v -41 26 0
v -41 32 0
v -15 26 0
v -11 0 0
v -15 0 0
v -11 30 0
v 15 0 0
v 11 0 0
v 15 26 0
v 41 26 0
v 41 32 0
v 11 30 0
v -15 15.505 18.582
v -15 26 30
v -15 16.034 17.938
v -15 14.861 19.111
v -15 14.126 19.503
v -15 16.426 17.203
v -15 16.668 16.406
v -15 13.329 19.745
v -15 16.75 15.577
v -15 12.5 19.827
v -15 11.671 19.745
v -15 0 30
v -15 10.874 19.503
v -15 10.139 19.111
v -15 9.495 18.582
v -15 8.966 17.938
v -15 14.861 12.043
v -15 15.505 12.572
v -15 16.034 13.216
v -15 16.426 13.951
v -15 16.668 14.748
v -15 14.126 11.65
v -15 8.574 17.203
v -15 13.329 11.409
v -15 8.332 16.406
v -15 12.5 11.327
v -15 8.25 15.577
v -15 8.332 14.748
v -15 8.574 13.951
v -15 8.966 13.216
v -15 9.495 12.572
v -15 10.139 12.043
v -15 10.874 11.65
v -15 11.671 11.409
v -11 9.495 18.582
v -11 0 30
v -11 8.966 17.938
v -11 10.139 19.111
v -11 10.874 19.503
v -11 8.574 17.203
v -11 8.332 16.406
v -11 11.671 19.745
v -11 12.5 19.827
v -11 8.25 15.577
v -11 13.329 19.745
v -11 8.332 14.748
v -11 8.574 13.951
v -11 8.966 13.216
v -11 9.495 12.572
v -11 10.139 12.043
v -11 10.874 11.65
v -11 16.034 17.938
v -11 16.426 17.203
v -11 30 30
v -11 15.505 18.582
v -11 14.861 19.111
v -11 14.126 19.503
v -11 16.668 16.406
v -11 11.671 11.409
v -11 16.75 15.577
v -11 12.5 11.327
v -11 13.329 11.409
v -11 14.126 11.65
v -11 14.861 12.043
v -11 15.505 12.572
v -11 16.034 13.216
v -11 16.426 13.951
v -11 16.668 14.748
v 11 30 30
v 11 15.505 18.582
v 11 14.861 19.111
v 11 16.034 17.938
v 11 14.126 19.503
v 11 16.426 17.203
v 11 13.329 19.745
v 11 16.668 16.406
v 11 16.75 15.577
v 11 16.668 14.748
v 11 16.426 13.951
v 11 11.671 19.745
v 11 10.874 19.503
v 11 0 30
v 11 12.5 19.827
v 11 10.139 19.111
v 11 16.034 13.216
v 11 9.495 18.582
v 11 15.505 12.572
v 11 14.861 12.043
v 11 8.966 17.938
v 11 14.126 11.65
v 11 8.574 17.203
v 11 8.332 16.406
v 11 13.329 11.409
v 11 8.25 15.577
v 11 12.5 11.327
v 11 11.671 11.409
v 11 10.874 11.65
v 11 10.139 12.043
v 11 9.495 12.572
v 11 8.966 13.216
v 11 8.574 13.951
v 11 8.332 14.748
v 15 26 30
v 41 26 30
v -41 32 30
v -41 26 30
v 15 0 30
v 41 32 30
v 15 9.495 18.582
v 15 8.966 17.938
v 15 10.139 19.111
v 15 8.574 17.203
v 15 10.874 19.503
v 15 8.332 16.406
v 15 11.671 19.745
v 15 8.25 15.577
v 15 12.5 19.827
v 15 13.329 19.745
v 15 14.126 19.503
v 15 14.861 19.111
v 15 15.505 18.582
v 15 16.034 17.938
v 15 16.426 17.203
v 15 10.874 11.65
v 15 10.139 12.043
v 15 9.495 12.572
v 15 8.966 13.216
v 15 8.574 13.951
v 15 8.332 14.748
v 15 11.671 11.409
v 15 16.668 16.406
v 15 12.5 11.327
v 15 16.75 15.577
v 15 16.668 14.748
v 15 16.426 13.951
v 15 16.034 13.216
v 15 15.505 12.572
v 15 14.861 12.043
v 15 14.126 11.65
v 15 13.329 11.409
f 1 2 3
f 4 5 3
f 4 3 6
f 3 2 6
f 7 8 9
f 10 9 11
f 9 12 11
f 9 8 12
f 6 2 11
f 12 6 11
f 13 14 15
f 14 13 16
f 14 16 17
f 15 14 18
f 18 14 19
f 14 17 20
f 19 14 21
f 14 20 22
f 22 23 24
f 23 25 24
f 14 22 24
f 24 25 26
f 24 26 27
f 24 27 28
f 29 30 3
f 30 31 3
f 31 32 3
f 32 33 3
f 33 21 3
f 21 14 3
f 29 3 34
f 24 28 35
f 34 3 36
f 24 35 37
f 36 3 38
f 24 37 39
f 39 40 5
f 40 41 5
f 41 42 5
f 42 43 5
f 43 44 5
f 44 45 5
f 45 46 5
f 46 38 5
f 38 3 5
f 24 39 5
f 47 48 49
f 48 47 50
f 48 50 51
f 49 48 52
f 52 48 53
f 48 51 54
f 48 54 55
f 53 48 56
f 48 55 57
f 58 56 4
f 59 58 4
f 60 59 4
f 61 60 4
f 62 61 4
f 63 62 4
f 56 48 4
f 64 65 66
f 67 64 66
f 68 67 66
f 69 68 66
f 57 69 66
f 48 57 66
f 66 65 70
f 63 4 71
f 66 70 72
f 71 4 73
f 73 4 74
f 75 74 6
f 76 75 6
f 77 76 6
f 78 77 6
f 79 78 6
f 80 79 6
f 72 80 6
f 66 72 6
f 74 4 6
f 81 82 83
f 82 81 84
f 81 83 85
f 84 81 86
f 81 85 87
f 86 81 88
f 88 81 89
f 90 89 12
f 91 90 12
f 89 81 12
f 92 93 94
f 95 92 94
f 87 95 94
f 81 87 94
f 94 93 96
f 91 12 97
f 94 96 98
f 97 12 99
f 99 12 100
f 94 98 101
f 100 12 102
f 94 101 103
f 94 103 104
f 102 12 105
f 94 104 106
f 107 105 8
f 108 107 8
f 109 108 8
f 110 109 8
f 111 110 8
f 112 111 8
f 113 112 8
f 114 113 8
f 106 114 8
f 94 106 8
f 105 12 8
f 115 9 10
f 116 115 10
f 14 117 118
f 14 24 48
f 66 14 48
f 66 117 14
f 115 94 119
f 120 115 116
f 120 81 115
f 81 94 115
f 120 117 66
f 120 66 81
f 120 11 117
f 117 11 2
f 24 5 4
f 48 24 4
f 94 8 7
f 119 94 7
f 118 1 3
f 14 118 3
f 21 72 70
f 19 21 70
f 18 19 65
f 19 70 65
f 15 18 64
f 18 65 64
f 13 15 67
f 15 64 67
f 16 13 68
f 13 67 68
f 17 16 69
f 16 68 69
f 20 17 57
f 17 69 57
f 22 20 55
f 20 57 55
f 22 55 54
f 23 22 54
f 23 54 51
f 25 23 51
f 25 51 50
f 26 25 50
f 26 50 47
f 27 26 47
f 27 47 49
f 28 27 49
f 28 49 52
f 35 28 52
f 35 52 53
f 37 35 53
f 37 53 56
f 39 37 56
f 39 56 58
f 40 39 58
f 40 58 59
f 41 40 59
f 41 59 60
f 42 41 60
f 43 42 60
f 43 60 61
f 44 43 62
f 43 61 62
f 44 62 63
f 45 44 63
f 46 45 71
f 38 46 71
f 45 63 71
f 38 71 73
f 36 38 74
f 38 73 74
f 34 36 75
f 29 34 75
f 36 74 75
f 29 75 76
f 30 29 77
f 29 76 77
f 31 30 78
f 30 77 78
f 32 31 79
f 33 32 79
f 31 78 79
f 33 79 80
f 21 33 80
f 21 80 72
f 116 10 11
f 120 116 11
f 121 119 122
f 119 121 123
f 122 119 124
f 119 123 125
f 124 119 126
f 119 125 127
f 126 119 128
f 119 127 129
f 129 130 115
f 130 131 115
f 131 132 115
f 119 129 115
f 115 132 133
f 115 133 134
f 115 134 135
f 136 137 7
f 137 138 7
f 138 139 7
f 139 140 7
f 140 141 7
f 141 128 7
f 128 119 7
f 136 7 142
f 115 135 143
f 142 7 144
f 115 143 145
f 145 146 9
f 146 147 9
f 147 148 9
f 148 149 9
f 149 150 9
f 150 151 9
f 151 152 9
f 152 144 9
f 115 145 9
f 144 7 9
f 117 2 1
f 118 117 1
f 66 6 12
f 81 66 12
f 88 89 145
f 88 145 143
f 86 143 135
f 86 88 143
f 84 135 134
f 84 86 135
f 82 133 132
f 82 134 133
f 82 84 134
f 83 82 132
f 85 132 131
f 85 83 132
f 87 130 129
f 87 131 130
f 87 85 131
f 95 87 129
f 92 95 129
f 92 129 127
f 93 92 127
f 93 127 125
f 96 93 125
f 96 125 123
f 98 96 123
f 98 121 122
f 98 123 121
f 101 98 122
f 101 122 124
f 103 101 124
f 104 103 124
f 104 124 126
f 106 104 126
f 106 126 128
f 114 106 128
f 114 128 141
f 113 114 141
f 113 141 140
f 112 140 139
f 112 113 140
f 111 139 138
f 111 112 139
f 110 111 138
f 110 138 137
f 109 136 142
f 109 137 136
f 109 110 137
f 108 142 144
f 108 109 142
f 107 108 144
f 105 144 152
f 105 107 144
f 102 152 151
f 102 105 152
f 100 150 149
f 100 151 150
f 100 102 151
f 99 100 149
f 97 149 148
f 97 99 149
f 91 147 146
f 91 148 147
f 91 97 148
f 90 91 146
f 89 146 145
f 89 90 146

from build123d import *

# Parameters (mm, degrees)
F1_DEPTH      = 30
F2_R          = 4.25
F3_DEPTH      = 41.001
F3_DEPTH_BACK = 41.001


with BuildPart() as f1:
    # F0 (on Top) → F1 (new body)
    with BuildSketch(Plane.XY):
        Polygon((11, 30), (11, 0), (15, 0), (15, 26), (41, 26), (41, 30), align=None)
        Polygon((-11, 30), (11, 30), (41, 30), (41, 32), (-41, 32), (-41, 30), align=None)
        Polygon((-11, 0), (-11, 30), (-41, 30), (-41, 26), (-15, 26), (-15, 0), align=None)
    extrude(amount=F1_DEPTH)

    # F2 (on Right) → F3 (cut, two sides)
    with BuildSketch(Plane.YZ) as f3_sk:
        with Locations((12.5, 15.5769230769)):
            Circle(F2_R)
    extrude(amount=-F3_DEPTH, mode=Mode.SUBTRACT)
    extrude(f3_sk.sketch, amount=F3_DEPTH_BACK, mode=Mode.SUBTRACT)


solid = f1.part
